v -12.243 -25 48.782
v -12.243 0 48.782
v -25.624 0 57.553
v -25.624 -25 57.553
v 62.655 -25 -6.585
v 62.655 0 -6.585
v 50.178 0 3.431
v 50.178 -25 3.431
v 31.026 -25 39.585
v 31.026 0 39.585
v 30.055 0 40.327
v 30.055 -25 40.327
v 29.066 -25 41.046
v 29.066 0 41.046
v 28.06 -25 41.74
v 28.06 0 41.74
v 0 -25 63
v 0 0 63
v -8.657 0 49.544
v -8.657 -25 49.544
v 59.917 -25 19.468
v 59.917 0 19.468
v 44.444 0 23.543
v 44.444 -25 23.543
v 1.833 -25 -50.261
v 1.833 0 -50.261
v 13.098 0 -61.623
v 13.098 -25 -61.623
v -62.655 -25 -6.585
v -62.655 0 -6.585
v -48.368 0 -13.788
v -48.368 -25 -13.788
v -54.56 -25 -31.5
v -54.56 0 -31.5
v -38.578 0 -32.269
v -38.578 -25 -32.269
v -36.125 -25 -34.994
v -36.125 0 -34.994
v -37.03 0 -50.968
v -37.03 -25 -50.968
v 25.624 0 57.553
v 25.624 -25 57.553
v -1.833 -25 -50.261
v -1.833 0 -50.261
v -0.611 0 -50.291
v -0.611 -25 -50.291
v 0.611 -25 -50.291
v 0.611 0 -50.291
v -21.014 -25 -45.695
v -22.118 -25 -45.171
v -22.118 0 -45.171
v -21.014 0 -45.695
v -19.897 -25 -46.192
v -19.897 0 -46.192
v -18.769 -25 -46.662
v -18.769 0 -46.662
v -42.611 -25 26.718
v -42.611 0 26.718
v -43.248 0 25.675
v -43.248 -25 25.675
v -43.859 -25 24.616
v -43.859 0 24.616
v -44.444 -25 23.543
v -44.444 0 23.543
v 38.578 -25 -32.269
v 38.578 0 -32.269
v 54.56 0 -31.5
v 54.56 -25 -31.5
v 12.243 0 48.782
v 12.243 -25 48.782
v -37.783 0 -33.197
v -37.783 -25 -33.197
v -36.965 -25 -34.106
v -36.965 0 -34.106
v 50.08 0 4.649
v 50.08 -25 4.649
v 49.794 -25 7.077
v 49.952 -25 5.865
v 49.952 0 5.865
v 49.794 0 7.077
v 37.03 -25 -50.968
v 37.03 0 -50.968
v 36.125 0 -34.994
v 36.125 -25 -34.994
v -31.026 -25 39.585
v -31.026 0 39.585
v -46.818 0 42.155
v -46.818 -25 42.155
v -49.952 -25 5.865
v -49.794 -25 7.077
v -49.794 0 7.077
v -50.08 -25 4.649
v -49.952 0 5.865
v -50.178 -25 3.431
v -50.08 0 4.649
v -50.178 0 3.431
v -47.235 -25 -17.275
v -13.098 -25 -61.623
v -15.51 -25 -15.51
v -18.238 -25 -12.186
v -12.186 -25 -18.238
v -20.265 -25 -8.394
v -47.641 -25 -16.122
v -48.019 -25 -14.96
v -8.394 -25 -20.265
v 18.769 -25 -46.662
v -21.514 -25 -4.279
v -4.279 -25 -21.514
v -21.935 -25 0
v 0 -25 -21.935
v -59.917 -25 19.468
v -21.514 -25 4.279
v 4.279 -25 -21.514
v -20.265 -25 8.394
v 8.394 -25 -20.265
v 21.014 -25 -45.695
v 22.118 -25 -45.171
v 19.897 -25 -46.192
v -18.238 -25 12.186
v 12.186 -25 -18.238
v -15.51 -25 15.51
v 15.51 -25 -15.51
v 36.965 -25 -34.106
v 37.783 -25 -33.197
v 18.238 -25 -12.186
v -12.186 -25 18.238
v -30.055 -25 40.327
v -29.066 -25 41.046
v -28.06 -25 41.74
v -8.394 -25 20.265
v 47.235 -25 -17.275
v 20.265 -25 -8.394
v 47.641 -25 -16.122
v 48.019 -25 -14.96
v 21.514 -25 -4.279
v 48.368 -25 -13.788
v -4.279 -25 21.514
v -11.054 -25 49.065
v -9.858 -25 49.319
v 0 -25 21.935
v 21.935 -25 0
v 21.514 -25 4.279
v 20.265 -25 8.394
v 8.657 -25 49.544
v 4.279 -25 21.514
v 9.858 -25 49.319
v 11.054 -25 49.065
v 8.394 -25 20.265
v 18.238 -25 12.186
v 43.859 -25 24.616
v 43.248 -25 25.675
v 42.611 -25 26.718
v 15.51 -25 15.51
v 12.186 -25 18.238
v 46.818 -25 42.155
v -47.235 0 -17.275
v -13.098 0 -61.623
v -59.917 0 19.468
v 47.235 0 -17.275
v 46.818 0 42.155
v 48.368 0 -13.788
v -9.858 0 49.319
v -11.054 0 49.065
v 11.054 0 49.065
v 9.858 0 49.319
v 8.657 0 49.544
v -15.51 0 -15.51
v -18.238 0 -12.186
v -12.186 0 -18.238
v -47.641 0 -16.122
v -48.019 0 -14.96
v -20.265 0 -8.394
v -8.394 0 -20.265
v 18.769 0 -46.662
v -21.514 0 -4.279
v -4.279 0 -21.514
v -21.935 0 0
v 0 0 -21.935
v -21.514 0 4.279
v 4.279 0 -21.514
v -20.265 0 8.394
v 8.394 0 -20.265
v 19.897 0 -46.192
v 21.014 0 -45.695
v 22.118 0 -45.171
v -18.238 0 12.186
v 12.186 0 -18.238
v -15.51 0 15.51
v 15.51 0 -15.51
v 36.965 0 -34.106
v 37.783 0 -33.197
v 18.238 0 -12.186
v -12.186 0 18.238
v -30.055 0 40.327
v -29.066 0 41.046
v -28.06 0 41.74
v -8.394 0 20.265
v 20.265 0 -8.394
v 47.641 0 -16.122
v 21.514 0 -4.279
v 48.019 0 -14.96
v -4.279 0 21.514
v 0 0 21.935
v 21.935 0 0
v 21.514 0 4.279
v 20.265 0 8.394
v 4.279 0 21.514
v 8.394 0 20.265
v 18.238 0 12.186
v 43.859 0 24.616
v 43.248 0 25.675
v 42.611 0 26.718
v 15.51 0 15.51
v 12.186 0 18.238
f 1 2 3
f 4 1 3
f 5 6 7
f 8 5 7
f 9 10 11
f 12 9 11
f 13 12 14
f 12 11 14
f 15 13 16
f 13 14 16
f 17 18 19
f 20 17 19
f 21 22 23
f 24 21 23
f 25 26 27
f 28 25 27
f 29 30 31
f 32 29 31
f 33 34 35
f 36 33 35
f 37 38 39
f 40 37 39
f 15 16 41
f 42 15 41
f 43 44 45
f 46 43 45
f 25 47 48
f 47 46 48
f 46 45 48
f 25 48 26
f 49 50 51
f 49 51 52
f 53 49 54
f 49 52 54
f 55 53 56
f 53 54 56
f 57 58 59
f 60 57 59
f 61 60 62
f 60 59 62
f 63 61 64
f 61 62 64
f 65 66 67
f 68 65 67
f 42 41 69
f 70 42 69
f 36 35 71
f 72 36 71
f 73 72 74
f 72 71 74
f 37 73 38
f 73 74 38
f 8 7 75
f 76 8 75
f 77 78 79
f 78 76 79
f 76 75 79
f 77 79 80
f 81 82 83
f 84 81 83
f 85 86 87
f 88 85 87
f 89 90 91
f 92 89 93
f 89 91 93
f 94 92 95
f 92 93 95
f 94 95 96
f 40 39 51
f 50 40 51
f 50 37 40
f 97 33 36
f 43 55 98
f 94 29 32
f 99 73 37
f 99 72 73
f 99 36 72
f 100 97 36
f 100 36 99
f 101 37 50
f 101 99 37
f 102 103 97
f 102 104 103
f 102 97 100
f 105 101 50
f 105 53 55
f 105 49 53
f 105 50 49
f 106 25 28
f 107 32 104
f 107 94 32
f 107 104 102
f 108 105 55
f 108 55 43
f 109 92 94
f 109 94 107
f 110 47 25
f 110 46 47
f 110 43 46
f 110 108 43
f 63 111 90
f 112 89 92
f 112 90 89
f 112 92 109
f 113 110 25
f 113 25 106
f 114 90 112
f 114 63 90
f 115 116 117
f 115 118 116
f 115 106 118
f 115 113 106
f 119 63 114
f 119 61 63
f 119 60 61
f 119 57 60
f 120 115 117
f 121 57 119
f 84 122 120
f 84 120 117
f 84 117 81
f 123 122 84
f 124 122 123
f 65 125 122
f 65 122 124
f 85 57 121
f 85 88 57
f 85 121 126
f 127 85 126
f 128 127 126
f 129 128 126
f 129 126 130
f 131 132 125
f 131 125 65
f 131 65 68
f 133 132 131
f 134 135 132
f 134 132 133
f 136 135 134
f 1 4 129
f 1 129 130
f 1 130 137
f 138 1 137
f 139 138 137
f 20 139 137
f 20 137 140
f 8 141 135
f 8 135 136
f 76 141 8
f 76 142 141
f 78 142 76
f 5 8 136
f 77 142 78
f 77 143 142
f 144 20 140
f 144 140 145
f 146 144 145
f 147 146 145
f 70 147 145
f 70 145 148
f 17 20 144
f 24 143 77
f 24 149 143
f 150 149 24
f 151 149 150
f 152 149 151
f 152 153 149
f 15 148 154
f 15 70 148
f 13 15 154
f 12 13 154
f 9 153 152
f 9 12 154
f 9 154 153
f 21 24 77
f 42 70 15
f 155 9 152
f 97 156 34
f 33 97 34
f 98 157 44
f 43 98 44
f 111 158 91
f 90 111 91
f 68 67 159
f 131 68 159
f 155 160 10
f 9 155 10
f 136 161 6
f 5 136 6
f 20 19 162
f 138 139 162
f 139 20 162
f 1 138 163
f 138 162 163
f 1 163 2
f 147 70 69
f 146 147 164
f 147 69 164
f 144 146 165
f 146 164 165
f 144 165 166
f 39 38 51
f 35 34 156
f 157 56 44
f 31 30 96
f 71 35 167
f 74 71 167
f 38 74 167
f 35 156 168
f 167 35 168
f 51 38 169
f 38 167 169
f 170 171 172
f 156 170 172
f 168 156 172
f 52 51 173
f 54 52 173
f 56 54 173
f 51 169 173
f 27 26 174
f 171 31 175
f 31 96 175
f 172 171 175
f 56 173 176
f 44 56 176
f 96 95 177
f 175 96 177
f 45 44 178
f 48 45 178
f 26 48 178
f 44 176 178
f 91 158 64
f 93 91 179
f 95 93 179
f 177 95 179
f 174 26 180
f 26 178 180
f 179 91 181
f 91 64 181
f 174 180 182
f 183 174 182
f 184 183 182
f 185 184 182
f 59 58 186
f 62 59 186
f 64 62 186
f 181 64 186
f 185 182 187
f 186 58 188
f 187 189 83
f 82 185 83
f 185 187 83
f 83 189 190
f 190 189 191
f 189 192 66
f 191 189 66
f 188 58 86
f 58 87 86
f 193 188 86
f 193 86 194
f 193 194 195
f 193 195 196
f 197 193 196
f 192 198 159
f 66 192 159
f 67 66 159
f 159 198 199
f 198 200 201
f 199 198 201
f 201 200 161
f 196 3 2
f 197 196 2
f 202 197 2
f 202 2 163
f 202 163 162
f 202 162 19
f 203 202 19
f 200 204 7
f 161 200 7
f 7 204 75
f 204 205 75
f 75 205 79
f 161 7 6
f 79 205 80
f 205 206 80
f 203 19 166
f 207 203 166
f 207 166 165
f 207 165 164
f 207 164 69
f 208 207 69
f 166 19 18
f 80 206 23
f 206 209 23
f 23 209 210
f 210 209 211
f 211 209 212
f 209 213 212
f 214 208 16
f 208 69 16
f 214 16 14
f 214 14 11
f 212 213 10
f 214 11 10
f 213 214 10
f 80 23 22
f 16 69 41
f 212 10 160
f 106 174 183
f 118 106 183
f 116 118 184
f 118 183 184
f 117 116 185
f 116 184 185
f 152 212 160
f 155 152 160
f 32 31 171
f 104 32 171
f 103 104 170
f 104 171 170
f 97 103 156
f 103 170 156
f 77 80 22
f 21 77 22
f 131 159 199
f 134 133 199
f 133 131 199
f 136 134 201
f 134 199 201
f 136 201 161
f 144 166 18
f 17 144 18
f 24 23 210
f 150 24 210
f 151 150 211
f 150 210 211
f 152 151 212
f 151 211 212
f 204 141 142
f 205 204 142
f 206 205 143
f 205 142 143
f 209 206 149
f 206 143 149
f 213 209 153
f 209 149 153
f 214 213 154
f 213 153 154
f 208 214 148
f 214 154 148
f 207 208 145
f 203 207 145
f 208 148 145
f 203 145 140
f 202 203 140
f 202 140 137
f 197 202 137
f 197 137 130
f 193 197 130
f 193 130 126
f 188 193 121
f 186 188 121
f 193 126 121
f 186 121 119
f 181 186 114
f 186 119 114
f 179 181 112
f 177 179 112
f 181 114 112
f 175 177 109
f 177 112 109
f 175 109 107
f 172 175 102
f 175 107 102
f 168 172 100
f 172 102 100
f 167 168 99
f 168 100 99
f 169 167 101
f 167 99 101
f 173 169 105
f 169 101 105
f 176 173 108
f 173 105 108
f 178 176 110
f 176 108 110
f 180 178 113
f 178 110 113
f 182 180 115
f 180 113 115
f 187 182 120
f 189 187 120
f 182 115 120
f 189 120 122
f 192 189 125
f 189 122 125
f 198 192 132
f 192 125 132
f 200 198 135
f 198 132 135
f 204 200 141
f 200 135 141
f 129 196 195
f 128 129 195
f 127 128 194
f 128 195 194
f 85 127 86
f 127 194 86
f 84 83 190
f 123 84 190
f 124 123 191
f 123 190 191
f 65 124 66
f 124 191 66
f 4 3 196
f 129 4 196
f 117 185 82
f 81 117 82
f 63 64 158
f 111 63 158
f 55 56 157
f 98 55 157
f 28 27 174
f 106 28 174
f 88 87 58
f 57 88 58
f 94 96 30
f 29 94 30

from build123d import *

# Parameters (mm, degrees)
F0_R            = 50.2948420816
F1_DEPTH        = 25
F2_R            = 21.9350719346
F3_DEPTH        = 25
F5_DEPTH        = 25
F5_COPIES_COUNT = 15


# Not quite as in the source:
# - a pattern or mirror of a feature is missing from the dataset's text; its kind, count and spacing are read off the source's solid


with BuildPart() as f1:
    # F0 (on Front) → F1 (new body)
    with BuildSketch(Plane.XZ):
        Circle(F0_R)
    extrude(amount=F1_DEPTH)

    # F2 (on face) → F3 (cut)
    with BuildSketch(Plane.XZ.offset(25)):
        Circle(F2_R)
    extrude(amount=-F3_DEPTH, mode=Mode.SUBTRACT)

    # F4 (on Front) → F5 (join)
    with BuildSketch(Plane.XZ):
        with BuildLine():
            Line((0, 63), (-8.656896714, 49.5442153969))
            ThreePointArc((-8.656896714, 49.5442153969), (0, 50.2948420816), (8.656896714, 49.5442153969))
            Line((8.656896714, 49.5442153969), (0, 63))
        make_face()
    f5 = extrude(amount=F5_DEPTH)

    # F5_copies: F5 ×15 about axis
    f5_copies_axis = Axis((0, 0, 0), (0, 1, 0))
    for i in range(1, F5_COPIES_COUNT):
        add(f5.rotate(f5_copies_axis, i * 360 / F5_COPIES_COUNT))


solid = f1.part
